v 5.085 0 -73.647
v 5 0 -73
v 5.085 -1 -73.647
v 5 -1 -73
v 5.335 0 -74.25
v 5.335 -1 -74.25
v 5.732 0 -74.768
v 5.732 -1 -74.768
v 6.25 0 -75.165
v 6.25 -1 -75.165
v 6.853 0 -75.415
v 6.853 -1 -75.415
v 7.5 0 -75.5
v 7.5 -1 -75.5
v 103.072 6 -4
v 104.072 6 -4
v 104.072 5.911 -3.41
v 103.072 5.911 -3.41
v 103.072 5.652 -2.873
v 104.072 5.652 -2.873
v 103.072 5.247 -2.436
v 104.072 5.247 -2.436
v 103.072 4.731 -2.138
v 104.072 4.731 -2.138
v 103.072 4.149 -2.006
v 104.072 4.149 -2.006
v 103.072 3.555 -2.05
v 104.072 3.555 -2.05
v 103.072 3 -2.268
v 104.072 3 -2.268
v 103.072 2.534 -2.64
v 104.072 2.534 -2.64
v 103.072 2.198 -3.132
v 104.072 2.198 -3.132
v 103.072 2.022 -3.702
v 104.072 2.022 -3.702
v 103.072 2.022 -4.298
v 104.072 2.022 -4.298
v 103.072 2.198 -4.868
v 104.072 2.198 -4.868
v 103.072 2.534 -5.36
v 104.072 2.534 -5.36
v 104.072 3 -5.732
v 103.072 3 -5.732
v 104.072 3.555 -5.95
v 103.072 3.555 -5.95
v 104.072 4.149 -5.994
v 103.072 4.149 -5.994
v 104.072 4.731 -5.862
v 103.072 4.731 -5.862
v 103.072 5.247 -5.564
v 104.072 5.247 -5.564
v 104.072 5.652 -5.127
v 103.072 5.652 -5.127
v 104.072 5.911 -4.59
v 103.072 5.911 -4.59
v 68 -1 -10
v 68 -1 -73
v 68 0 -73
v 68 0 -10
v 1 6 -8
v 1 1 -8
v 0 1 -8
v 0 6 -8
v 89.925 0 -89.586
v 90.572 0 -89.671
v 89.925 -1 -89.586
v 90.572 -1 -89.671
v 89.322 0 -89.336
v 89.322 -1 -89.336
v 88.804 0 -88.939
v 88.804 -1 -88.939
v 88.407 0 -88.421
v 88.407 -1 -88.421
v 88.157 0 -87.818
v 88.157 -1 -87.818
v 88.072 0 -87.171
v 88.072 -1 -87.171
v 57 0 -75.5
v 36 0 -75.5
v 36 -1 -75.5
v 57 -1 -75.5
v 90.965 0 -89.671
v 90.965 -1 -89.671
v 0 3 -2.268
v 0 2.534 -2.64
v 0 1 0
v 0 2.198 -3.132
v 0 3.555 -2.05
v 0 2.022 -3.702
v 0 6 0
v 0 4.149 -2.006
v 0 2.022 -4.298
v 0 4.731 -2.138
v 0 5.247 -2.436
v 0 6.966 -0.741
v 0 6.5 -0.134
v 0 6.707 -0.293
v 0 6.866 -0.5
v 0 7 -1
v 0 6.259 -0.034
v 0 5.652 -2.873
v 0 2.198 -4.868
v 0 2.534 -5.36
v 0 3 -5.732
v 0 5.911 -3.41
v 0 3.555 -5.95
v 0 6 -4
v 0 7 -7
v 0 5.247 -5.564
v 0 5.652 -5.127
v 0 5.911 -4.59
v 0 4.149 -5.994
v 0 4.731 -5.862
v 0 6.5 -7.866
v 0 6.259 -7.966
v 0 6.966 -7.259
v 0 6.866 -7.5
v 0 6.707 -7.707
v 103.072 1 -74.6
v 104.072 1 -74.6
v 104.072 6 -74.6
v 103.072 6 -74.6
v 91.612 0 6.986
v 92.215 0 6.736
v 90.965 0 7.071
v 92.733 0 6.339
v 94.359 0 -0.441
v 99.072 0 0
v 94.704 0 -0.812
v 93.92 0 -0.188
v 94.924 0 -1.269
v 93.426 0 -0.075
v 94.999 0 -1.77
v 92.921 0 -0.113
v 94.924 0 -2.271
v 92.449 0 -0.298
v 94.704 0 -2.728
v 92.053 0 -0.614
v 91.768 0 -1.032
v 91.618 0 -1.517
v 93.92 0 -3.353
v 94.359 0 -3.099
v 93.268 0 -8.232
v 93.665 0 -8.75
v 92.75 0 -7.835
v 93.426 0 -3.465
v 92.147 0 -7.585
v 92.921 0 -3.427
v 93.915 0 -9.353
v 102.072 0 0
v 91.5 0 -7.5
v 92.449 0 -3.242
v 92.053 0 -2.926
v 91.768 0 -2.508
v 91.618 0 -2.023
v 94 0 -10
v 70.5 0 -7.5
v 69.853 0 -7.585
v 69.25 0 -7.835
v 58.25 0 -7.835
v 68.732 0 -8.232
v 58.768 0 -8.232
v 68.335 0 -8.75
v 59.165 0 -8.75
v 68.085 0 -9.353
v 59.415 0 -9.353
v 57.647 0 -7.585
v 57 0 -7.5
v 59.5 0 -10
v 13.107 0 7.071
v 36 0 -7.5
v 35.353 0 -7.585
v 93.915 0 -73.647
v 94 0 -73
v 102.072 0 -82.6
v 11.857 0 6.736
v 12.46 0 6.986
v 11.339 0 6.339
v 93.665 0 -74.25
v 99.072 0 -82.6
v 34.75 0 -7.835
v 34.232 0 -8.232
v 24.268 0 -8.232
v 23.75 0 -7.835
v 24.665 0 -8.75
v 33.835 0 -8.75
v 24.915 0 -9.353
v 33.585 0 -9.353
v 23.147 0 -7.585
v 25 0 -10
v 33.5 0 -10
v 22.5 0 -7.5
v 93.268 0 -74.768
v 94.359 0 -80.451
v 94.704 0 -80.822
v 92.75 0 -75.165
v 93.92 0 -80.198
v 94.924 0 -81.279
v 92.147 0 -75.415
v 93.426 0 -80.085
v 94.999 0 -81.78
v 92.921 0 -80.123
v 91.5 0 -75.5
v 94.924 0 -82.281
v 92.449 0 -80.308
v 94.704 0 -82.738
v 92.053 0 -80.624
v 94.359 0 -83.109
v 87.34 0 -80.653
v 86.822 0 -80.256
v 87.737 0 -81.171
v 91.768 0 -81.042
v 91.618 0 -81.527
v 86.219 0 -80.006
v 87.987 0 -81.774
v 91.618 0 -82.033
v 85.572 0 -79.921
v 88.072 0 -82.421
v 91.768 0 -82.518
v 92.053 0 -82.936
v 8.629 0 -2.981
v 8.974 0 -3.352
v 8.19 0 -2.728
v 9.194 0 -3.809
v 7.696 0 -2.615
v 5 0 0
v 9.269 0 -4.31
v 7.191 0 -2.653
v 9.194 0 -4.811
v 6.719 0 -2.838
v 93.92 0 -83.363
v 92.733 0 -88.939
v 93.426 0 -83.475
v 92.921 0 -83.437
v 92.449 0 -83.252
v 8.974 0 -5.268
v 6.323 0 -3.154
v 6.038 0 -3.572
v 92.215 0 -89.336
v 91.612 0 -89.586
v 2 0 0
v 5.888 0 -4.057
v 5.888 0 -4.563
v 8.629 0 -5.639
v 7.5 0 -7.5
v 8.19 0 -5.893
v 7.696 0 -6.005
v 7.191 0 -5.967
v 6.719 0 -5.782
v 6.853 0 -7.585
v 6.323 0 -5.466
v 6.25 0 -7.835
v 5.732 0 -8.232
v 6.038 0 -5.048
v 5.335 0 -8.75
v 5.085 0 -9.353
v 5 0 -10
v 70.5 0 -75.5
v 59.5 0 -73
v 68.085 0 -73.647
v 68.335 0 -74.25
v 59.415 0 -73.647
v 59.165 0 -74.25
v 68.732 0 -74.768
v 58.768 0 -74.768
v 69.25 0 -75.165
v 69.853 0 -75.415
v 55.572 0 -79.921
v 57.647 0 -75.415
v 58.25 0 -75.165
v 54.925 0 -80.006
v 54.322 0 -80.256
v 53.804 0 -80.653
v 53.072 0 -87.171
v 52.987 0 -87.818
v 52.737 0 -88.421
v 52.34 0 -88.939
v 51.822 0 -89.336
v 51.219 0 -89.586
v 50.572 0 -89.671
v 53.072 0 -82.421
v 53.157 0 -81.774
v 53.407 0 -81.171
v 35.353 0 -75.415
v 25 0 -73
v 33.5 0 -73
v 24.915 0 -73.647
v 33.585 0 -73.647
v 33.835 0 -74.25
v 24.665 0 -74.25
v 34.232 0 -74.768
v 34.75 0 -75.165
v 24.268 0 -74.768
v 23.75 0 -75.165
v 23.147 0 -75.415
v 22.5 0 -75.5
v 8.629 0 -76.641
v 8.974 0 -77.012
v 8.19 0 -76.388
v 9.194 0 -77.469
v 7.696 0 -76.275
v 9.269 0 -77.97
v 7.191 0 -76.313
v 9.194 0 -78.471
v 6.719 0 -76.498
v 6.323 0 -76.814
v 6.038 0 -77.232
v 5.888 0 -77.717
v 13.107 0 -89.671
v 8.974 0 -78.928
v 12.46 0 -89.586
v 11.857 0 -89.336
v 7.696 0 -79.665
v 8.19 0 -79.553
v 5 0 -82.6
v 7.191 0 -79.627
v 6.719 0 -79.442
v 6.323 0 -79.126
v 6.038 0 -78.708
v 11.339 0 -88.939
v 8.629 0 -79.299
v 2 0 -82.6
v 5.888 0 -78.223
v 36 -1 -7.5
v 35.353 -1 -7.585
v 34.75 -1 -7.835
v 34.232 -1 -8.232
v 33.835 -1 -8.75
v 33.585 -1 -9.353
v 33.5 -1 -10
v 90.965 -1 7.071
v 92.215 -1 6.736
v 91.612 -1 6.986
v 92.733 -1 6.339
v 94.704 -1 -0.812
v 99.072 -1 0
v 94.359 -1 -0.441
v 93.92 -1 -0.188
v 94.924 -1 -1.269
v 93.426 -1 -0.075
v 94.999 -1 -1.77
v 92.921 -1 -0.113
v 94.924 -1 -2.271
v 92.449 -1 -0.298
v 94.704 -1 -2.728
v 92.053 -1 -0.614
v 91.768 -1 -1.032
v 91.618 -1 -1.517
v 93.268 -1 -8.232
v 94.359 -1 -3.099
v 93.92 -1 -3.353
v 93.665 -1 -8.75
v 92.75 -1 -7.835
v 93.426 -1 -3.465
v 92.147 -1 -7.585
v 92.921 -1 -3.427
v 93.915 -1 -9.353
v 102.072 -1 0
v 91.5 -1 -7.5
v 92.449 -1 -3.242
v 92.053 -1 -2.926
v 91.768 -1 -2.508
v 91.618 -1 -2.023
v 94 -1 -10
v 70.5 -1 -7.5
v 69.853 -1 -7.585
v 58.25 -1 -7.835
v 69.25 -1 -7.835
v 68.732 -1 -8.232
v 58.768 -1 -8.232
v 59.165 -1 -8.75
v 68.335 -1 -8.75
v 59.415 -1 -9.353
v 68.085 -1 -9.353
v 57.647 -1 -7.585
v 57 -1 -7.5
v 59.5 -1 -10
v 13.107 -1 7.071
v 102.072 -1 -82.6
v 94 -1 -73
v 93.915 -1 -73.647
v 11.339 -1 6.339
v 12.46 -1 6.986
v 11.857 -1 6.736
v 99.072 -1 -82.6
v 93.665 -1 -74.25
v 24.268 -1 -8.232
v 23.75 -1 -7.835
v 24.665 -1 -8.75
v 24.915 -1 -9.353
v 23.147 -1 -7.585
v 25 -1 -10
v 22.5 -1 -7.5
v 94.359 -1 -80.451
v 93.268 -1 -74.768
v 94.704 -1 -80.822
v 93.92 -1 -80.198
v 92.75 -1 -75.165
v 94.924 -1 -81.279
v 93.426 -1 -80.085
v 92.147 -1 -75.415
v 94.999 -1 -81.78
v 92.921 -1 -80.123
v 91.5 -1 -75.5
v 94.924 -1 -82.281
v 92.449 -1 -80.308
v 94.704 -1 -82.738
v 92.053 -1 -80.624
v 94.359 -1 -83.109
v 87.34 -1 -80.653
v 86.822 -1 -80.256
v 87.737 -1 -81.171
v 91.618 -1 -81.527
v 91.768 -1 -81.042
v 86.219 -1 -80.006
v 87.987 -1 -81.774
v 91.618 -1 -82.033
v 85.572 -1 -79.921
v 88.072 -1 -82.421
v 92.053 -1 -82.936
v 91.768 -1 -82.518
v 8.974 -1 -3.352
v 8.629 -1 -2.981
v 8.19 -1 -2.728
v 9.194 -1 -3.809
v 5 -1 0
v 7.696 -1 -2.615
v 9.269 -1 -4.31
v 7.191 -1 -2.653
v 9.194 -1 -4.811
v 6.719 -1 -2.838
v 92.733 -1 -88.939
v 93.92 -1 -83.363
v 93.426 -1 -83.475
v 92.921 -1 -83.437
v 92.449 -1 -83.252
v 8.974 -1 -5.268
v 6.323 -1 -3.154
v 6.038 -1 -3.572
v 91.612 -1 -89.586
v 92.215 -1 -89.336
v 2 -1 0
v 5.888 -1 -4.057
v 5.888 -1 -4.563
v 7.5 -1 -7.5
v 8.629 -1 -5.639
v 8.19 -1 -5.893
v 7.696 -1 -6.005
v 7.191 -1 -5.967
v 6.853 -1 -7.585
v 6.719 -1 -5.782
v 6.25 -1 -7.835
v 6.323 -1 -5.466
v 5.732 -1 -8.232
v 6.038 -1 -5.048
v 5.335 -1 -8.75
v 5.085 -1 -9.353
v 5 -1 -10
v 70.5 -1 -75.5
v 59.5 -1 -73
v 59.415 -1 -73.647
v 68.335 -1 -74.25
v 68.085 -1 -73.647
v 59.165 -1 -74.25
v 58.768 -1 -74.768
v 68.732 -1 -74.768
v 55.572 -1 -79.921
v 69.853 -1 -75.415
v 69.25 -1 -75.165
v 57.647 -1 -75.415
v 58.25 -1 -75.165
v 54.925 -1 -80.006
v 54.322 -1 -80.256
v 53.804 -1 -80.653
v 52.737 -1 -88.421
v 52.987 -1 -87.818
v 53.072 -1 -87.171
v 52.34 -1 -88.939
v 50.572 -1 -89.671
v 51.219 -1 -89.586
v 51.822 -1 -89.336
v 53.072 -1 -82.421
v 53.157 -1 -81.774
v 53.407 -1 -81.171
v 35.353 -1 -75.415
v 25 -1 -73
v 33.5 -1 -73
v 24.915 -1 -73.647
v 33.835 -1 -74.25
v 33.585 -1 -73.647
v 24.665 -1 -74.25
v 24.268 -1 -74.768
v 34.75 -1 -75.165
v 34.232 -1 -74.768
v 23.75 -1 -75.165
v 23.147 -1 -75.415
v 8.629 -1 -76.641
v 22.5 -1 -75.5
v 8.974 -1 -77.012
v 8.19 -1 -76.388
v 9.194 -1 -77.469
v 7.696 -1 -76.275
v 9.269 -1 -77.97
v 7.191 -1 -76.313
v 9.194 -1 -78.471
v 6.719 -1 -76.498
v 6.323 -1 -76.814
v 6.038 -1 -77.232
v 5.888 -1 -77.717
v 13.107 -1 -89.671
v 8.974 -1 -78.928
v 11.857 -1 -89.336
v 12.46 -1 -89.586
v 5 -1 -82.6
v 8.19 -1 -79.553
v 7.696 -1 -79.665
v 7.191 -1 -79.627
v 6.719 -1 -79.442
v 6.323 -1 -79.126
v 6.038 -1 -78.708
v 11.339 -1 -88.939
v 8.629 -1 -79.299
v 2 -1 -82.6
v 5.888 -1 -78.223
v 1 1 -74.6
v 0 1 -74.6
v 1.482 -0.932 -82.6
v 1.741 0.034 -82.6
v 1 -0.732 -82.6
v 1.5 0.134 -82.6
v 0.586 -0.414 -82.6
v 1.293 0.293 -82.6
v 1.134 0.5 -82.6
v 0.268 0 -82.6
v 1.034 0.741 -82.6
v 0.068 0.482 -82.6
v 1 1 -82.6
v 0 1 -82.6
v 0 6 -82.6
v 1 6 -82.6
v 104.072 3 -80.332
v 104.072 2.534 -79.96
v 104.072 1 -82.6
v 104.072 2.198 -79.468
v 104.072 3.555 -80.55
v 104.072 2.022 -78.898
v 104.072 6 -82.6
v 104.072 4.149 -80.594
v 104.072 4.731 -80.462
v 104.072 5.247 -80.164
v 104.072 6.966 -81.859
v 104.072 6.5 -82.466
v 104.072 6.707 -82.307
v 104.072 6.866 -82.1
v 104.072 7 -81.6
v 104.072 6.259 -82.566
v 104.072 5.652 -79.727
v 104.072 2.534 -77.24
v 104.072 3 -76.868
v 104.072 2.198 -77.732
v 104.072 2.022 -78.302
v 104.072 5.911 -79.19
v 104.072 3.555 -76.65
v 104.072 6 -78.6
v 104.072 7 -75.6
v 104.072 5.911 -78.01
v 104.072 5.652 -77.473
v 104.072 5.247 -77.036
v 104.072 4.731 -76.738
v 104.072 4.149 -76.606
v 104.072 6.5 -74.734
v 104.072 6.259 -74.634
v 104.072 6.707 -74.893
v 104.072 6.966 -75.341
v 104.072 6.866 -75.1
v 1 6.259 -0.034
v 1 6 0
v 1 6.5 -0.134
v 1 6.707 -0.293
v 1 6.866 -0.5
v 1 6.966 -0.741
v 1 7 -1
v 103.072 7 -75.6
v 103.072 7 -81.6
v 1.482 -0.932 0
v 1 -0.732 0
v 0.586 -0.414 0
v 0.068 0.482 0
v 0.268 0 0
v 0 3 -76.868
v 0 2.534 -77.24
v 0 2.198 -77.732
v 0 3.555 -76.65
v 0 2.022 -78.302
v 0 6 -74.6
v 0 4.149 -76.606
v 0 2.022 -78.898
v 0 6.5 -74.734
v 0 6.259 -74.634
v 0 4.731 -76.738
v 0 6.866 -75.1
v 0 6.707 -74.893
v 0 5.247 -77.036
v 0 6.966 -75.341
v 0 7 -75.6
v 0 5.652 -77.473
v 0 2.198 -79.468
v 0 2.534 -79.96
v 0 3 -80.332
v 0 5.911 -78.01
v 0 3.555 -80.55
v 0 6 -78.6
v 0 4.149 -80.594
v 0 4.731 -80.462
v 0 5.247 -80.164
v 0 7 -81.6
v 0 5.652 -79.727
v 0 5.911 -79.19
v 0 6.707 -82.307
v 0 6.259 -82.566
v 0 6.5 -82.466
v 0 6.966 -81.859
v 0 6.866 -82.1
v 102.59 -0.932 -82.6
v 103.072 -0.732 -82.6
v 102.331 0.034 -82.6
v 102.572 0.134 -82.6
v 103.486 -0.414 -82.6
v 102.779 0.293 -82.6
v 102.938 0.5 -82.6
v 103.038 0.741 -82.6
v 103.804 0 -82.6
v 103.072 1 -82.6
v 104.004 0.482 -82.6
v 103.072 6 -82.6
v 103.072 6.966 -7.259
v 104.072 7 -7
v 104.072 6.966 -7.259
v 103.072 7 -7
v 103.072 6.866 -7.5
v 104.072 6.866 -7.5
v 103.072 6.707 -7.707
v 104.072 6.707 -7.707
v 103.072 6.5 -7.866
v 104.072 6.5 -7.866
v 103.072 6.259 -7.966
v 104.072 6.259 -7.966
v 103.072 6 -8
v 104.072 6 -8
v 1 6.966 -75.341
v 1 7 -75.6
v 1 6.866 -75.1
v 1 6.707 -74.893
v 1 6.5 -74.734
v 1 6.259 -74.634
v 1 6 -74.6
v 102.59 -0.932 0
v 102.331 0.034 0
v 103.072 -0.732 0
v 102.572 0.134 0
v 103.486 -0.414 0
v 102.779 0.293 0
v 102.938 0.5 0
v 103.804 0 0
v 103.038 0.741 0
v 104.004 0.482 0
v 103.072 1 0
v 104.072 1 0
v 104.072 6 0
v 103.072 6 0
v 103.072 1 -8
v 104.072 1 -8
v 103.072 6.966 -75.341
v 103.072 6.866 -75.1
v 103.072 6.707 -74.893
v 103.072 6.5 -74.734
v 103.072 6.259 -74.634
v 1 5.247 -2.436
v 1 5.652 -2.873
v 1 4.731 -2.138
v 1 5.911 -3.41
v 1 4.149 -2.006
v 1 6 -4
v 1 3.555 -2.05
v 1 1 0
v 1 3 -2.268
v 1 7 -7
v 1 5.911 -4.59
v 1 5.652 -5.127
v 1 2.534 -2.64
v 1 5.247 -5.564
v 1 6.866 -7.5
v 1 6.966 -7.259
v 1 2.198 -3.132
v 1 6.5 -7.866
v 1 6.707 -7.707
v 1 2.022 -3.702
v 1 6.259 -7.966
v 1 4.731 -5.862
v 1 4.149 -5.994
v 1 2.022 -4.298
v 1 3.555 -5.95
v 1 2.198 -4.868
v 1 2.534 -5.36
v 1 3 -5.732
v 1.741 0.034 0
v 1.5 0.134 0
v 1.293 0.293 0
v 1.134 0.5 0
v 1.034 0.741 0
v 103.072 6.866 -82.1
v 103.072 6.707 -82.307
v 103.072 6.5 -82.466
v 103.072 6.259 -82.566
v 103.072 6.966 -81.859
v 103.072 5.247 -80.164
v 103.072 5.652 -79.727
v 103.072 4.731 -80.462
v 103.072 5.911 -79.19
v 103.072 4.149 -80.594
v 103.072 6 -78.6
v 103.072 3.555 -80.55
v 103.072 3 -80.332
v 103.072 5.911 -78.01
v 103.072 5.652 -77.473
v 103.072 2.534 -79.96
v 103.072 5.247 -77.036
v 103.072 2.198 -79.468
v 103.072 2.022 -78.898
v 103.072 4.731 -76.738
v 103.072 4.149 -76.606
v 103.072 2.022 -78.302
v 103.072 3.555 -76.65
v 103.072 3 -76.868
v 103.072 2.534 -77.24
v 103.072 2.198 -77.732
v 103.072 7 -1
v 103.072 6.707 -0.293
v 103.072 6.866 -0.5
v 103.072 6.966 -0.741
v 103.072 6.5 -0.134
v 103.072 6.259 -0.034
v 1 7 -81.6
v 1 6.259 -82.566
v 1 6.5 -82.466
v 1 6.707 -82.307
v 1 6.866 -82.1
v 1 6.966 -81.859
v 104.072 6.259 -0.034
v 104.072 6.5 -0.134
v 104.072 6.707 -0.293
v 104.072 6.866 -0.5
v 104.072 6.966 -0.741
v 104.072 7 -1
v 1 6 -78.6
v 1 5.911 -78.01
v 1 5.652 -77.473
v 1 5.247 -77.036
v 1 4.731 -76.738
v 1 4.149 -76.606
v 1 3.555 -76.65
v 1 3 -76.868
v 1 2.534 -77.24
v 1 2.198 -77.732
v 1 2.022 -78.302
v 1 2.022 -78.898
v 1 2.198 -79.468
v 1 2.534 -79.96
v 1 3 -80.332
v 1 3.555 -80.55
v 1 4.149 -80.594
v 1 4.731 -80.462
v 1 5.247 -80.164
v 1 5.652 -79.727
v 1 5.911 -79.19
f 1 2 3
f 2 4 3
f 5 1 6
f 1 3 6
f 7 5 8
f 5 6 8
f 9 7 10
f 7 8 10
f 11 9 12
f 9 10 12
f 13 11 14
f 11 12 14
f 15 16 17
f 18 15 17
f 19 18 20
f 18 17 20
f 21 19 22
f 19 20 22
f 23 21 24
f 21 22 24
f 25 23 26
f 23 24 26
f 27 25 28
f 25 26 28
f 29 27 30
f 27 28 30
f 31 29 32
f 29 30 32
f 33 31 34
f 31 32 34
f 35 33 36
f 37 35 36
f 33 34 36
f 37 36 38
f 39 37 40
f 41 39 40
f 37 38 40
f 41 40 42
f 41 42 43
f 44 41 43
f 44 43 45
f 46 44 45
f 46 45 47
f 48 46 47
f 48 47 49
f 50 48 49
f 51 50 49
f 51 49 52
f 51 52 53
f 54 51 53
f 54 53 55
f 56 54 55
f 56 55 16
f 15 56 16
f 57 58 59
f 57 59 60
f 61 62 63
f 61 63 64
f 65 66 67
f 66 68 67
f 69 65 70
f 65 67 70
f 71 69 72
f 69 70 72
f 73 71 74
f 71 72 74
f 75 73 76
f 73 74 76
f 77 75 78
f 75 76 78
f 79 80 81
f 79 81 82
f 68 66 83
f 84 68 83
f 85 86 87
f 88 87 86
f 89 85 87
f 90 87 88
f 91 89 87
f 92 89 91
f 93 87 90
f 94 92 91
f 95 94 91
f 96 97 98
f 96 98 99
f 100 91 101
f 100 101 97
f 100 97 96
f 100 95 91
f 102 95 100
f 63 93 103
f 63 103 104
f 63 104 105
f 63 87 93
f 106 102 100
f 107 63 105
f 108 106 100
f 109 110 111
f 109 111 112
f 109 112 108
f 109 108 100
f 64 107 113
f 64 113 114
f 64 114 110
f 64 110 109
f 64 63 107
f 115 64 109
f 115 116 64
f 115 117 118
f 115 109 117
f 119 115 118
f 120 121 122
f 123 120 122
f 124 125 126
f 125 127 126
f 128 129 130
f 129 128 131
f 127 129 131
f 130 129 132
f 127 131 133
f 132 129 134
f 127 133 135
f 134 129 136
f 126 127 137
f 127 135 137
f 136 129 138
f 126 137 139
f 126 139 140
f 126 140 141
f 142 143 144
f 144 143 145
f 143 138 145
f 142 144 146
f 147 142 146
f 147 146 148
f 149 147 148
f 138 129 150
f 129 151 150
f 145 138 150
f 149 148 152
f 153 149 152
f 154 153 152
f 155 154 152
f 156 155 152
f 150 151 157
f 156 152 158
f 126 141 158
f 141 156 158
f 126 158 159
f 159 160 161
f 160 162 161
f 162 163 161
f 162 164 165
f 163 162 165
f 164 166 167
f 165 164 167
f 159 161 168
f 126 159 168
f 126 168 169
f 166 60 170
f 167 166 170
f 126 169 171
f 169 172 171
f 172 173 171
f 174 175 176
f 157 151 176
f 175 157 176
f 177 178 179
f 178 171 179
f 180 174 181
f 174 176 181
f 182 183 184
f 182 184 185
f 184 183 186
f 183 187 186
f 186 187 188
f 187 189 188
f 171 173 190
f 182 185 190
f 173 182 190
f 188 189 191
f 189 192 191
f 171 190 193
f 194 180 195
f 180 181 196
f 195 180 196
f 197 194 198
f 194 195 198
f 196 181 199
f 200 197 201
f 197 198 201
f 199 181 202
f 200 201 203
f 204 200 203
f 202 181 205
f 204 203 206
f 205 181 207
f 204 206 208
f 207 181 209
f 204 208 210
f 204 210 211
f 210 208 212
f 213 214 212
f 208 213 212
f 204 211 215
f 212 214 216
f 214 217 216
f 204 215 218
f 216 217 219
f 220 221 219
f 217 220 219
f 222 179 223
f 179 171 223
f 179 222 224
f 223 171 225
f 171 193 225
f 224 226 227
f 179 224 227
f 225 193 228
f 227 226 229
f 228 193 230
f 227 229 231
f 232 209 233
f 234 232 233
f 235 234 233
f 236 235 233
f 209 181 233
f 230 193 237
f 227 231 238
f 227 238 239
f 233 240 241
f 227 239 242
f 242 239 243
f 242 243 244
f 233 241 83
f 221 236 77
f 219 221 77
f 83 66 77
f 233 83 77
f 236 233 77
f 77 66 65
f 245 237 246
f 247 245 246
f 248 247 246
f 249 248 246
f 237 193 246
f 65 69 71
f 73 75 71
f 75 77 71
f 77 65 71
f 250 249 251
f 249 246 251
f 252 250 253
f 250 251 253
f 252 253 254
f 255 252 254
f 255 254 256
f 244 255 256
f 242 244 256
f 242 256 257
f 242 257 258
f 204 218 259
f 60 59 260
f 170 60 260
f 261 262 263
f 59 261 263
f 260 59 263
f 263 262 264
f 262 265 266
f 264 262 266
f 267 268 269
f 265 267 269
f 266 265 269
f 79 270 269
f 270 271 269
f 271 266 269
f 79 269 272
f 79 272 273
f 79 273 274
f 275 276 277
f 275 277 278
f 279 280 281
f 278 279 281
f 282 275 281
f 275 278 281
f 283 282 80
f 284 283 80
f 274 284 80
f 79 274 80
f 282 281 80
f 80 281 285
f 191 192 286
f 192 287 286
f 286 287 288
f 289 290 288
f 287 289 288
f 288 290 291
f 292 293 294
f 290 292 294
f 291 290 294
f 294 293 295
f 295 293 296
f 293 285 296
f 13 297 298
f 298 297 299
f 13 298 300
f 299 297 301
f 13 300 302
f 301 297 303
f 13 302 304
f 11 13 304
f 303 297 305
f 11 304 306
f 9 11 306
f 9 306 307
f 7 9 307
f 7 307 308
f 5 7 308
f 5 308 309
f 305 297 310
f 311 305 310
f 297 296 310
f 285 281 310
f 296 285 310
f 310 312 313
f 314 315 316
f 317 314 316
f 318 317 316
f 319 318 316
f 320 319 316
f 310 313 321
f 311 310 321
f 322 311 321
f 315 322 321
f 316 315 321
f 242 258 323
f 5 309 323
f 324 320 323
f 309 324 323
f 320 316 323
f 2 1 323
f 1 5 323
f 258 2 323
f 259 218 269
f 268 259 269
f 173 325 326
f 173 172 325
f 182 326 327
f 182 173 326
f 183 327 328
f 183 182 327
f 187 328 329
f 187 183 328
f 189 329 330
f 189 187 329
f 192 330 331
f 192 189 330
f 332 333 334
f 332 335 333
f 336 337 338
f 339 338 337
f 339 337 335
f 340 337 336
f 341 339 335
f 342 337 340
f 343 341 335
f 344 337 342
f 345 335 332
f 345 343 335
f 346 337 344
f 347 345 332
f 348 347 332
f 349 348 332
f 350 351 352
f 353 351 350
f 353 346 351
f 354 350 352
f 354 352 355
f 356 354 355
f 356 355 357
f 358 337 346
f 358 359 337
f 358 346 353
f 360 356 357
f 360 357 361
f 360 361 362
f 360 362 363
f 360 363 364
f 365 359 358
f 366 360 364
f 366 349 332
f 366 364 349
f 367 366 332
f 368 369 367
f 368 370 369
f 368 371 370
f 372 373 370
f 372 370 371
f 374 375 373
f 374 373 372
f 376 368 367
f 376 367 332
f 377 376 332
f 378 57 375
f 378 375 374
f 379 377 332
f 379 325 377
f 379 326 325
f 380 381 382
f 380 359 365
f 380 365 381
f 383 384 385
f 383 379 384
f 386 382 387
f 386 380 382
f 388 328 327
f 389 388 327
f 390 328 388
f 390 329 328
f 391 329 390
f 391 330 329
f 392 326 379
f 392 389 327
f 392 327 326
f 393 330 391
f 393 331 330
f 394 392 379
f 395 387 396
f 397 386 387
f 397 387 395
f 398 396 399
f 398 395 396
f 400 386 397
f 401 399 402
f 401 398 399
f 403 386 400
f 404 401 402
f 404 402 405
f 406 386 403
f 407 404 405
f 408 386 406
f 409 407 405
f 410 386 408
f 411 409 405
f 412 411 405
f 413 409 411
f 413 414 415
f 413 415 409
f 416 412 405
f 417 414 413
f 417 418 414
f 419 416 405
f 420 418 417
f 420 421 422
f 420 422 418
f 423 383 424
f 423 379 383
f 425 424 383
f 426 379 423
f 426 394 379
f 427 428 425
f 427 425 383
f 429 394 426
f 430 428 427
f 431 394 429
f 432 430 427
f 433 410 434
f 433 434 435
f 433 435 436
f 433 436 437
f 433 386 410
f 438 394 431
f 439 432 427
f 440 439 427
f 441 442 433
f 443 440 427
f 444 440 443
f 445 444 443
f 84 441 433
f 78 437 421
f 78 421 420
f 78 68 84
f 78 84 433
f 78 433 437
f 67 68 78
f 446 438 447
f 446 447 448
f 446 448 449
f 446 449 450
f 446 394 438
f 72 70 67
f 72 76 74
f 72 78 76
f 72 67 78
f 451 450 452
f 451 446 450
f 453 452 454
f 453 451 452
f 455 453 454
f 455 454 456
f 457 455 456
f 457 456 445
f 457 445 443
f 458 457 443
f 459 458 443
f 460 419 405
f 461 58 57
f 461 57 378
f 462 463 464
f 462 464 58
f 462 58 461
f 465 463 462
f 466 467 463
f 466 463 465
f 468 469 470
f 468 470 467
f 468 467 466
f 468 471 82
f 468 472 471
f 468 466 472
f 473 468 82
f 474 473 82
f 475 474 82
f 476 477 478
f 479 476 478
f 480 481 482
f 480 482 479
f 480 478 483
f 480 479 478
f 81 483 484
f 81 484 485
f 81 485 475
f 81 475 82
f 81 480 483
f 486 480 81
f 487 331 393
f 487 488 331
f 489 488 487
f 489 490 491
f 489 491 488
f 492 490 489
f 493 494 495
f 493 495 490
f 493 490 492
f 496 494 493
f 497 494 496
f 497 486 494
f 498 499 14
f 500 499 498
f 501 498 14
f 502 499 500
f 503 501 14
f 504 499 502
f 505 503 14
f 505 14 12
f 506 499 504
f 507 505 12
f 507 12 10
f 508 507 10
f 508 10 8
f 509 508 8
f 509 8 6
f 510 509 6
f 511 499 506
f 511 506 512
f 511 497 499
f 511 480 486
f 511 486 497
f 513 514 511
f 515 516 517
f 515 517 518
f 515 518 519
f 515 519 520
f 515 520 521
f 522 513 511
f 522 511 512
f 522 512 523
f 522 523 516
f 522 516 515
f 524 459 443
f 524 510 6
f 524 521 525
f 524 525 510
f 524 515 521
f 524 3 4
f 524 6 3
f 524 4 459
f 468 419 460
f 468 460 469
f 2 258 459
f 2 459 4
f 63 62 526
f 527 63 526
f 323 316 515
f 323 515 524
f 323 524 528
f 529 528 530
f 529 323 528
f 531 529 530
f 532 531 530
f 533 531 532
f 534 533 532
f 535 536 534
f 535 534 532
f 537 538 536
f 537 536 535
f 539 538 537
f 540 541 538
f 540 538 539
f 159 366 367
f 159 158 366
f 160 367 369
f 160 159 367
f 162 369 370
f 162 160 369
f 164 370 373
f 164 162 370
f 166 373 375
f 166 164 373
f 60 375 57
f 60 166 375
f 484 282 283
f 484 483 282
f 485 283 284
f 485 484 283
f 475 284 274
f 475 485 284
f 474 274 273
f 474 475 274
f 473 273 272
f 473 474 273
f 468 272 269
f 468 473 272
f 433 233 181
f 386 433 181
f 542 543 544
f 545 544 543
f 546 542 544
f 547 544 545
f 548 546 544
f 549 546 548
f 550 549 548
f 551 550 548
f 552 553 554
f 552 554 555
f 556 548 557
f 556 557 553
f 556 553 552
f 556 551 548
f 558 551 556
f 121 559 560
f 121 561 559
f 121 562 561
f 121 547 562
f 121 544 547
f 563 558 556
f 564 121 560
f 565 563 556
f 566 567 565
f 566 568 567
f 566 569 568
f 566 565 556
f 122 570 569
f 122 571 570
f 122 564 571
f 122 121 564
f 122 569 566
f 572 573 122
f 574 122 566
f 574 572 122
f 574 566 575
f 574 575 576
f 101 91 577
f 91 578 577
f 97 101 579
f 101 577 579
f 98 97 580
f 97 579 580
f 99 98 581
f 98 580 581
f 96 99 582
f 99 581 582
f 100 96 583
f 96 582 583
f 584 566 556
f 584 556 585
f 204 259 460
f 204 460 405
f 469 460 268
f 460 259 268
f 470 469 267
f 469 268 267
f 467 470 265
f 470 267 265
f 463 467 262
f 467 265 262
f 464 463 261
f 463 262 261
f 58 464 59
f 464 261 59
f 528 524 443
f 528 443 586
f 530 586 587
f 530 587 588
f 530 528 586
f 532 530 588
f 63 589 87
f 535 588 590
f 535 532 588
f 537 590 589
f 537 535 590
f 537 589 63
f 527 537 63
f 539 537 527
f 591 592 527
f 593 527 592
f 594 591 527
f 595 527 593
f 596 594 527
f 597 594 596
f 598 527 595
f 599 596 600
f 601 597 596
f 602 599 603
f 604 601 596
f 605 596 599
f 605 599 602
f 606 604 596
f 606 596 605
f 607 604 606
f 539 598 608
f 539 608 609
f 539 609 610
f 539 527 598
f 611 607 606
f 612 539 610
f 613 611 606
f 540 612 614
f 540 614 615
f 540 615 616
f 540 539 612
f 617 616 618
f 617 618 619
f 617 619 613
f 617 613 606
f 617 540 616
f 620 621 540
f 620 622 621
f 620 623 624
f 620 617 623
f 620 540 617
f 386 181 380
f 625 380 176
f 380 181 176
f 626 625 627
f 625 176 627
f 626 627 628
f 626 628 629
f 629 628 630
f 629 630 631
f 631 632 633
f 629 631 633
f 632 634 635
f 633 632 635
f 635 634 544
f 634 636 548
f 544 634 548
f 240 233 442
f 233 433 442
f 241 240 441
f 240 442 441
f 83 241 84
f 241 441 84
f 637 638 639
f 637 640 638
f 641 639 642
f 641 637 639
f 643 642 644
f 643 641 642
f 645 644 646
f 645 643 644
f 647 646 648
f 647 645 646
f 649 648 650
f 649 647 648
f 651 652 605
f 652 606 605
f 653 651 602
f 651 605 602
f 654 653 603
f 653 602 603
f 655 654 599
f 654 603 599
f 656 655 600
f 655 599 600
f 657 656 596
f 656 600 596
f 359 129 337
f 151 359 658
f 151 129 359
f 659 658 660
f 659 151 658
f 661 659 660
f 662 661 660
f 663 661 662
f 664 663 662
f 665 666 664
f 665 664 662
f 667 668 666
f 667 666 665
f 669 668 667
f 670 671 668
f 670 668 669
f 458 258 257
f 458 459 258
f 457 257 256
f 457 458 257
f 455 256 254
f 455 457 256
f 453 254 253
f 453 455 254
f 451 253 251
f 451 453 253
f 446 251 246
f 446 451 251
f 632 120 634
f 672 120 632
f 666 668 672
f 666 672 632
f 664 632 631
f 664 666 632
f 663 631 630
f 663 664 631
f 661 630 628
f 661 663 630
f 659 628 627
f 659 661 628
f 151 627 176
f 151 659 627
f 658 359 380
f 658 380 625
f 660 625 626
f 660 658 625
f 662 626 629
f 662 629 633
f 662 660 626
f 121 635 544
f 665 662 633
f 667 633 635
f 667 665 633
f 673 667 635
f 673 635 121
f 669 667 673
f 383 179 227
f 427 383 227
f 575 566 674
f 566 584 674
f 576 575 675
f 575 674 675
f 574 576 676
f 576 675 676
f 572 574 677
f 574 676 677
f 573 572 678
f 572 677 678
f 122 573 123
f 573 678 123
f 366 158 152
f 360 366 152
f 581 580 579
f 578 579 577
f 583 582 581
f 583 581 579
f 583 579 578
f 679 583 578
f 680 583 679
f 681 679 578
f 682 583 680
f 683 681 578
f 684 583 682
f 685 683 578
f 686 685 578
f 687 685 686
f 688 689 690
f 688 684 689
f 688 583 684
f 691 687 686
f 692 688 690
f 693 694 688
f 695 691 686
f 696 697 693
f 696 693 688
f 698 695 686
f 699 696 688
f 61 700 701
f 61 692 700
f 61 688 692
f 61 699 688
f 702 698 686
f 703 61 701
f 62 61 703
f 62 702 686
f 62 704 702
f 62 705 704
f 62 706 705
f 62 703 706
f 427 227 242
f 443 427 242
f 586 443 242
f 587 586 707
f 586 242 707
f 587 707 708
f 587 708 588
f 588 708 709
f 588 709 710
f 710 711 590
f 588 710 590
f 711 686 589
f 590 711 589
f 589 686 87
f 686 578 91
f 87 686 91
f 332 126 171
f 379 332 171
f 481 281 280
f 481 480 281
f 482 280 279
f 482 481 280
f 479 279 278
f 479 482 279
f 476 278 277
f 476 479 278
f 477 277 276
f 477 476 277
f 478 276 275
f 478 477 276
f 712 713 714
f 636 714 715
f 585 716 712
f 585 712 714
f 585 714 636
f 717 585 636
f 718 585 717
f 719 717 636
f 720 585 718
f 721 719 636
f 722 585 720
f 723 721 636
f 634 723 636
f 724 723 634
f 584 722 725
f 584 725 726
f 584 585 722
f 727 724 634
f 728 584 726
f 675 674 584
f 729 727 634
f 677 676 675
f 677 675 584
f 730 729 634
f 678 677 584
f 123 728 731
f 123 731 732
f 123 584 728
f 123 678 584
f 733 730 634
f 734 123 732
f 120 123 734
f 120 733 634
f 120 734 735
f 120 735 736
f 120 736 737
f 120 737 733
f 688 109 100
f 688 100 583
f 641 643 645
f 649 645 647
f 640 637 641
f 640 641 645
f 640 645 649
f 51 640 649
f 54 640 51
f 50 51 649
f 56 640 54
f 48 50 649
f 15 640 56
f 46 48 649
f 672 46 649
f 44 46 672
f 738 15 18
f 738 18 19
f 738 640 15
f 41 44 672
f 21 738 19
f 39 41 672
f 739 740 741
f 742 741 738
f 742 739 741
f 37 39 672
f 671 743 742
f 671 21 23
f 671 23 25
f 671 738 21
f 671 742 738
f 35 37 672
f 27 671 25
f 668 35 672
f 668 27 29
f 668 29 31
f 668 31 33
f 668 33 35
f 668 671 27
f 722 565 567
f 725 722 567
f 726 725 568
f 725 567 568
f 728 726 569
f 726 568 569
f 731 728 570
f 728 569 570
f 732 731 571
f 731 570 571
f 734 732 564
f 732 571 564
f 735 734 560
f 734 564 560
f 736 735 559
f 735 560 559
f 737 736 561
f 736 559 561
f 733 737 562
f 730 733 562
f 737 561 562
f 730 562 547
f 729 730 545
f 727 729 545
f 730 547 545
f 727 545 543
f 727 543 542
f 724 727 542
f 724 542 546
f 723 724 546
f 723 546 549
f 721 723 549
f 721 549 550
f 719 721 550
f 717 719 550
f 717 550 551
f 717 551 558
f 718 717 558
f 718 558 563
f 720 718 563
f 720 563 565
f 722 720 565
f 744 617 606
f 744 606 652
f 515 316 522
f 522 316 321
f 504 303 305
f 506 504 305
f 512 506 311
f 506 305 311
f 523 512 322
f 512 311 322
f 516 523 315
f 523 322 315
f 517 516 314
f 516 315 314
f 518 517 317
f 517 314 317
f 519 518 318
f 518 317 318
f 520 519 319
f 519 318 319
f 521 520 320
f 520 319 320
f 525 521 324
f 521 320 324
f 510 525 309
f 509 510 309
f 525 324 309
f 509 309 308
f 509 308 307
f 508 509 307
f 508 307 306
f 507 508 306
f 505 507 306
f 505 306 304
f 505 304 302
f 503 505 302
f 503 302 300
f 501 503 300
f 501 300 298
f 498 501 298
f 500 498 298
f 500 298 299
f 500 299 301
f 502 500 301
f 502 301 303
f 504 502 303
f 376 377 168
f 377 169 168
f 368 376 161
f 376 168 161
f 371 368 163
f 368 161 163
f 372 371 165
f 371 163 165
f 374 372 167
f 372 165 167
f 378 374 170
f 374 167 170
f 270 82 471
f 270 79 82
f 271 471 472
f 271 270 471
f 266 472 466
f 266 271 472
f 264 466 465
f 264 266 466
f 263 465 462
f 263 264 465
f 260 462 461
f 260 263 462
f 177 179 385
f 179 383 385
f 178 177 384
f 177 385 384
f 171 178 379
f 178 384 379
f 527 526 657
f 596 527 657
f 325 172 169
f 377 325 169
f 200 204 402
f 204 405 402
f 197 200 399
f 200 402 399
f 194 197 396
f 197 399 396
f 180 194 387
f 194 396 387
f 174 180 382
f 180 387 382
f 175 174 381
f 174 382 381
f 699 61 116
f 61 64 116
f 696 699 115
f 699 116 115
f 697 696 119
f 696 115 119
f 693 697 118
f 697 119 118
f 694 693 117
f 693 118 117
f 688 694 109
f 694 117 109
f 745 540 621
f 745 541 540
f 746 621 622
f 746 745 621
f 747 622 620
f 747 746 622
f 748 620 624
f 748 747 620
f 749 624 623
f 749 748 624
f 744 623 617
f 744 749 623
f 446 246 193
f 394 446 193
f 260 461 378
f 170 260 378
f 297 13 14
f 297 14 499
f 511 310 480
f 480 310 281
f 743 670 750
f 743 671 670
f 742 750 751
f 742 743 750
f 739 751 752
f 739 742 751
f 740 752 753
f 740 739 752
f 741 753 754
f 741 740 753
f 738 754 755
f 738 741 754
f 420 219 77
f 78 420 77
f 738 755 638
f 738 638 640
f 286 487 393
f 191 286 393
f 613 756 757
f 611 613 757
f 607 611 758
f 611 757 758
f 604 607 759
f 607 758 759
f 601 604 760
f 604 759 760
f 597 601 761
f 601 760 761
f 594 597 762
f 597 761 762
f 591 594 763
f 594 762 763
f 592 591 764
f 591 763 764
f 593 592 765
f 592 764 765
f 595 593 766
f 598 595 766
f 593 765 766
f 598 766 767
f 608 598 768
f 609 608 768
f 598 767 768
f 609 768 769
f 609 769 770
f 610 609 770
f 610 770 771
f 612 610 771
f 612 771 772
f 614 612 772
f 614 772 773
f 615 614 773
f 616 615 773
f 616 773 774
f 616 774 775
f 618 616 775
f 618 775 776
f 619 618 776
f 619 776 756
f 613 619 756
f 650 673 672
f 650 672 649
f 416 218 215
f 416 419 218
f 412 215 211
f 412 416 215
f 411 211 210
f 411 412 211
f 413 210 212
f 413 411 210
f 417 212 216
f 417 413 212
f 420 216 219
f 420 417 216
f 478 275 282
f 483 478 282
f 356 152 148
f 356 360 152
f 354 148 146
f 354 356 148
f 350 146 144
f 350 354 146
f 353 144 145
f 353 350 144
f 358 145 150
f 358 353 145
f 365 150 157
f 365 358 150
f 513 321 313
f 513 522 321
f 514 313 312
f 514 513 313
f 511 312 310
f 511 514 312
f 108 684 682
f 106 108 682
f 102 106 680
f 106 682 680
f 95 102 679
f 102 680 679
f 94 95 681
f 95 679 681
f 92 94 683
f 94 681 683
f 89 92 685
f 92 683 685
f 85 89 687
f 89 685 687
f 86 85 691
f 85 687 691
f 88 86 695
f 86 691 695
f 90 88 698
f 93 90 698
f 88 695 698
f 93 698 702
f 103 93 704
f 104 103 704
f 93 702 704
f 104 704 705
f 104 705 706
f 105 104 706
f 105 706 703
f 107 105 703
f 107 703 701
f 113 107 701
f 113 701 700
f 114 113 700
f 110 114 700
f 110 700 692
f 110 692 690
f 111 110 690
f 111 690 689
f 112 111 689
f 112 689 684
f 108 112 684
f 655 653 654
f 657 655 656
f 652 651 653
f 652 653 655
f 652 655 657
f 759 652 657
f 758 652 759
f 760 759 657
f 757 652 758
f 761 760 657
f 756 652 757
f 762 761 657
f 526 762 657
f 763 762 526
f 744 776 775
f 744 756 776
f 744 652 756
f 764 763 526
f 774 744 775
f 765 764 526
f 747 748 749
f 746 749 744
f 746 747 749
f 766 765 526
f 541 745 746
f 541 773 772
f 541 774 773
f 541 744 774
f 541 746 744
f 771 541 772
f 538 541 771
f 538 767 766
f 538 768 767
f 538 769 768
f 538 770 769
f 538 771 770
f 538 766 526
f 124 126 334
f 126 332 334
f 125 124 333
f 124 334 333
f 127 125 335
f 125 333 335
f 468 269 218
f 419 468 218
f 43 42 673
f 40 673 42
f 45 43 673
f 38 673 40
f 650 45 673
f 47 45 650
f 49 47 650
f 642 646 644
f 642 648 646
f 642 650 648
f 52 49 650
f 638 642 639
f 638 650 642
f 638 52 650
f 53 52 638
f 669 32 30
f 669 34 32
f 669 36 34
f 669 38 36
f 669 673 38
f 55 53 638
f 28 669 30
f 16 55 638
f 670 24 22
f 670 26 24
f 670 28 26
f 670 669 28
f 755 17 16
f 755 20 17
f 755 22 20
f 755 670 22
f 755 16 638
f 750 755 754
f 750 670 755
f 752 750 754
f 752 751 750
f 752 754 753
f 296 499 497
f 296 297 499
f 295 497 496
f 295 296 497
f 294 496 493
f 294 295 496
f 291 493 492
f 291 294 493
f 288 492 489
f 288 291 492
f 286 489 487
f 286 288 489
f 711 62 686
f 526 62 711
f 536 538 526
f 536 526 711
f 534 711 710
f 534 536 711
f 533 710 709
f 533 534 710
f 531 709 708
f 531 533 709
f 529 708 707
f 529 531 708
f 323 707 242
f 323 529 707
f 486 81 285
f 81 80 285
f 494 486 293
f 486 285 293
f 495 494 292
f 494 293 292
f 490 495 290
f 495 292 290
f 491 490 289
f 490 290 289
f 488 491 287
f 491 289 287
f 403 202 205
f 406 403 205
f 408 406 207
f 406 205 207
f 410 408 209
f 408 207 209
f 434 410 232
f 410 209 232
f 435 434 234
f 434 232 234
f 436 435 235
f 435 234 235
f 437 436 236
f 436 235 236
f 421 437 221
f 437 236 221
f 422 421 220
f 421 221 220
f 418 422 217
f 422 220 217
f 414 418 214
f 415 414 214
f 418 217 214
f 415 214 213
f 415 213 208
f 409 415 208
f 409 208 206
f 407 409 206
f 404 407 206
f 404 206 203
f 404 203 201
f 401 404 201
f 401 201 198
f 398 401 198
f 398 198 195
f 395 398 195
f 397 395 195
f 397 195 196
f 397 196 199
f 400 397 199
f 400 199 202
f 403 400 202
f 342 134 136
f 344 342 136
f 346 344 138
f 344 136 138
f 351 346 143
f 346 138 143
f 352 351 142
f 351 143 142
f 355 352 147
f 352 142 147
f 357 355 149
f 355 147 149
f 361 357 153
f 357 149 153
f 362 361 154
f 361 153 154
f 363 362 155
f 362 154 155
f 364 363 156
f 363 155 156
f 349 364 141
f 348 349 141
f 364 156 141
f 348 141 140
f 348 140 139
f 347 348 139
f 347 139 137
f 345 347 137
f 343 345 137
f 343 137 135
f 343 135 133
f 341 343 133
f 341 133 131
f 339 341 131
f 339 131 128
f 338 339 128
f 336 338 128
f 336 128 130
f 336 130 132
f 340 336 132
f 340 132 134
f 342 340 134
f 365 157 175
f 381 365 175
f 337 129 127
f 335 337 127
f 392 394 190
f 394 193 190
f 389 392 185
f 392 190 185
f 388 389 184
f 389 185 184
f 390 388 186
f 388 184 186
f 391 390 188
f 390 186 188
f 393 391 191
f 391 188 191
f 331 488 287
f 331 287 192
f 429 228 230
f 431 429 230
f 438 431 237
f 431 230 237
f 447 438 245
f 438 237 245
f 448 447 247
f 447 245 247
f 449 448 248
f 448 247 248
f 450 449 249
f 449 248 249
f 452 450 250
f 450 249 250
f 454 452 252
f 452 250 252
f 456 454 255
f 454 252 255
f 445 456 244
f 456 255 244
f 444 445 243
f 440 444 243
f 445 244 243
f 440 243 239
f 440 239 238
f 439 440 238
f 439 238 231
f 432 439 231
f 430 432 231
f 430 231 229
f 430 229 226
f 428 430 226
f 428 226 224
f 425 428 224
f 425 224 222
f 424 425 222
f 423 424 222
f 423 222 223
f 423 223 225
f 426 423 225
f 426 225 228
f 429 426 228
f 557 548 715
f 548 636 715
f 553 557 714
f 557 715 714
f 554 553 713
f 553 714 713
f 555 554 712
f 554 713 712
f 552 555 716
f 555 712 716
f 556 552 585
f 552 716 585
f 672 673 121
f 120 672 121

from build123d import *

# Parameters (mm, degrees)
SKETCH1_W                      = 89
SKETCH1_H                      = 68
BASE_FLANGE2_DEPTH             = 1
EDGE_FLANGE1_STRIP_W           = 6
EDGE_FLANGE1_STRIP_H           = 1
EDGE_FLANGE1_STRIP_CUT_DEPTH   = 82.6
EDGE_FLANGE1_STRIP_2_W         = 6
EDGE_FLANGE1_STRIP_2_H         = 1
EDGE_FLANGE1_STRIP_CUT_2_DEPTH = 82.6
EDGE_FLANGE1_DEPTH             = 82.6
EDGE_FLANGE1_BEND_DEPTH        = 82.6
SKETCH16_W                     = 66.6
SKETCH16_H                     = 7
CUT_EXTRUDE1_DEPTH             = 138.553195479
FILLET1_R                      = 1
SKETCH17_R                     = 2
CUT_EXTRUDE2_DEPTH             = 138.553195479
M3_CLEARANCE_HOLE1_D           = 3.4
FILLET2_R                      = 2.5
SKETCH20_W                     = 8.5
SKETCH20_H                     = 68
BOSS_EXTRUDE1_DEPTH            = 1
FILLET3_R                      = 2.5


# Sheet-metal steps are written as plain solids
with BuildPart() as part:
    # Sketch1 → Base-Flange2 (new body)
    with BuildSketch(Plane(origin=(0, 0, 0), x_dir=(1, 0, 0), z_dir=(0, 1, 0))):
        Polygon((0, 0), (0, 82.6), (5, 82.6), (12.071067812, 89.671067812), (53.072, 89.671067812), (53.072, 79.921067812), (88.072, 79.921067812), (88.072, 89.671067812), (92.000932188, 89.671067812), (99.072, 82.6), (104.072, 82.6), (104.072, 0), (99.072, 0), (92.000932188, -7.071067812), (12.071067812, -7.071067812), (5, 0), align=None)
        with Locations((49.5, 41.5)):
            Rectangle(SKETCH1_W, SKETCH1_H, mode=Mode.SUBTRACT)
    extrude(amount=-BASE_FLANGE2_DEPTH)

    # Edge-Flange1 strip (across the edge) → Edge-Flange1 strip cut (cut)
    with BuildSketch(Plane(origin=(104.072, 0, 0), x_dir=(-1, 0, 0), z_dir=(0, 0, -1))):
        with Locations((-1, -0.5)):
            Rectangle(EDGE_FLANGE1_STRIP_W, EDGE_FLANGE1_STRIP_H)
    extrude(amount=EDGE_FLANGE1_STRIP_CUT_DEPTH, mode=Mode.SUBTRACT)

    # Edge-Flange1 strip 2 (across the edge) → Edge-Flange1 strip cut 2 (cut)
    with BuildSketch(Plane.XY.offset(-82.6)):
        with Locations((-1, -0.5)):
            Rectangle(EDGE_FLANGE1_STRIP_2_W, EDGE_FLANGE1_STRIP_2_H)
    extrude(amount=EDGE_FLANGE1_STRIP_CUT_2_DEPTH, mode=Mode.SUBTRACT)

    # Edge-Flange1 section (across the edge) → Edge-Flange1 (add)
    with BuildSketch(Plane(origin=(104.072, 0, 0), x_dir=(-1, 0, 0), z_dir=(0, 0, -1))):
        with BuildLine():
            Line((0, 1), (0, 7))
            Line((0, 7), (1, 7))
            Line((1, 7), (1, 1))
            ThreePointArc((1, 1), (1.292893219, 0.292893219), (2, 0))
            Line((2, 0), (2, -1))
            ThreePointArc((2, -1), (0.585786438, -0.414213562), (0, 1))
        make_face()
    extrude(amount=EDGE_FLANGE1_DEPTH)

    # Edge-Flange1 section 2 (across the edge) → Edge-Flange1 bend (add)
    with BuildSketch(Plane.XY.offset(-82.6)):
        with BuildLine():
            Line((0, 1), (0, 7))
            Line((0, 7), (1, 7))
            Line((1, 7), (1, 1))
            ThreePointArc((1, 1), (1.292893219, 0.292893219), (2, 0))
            Line((2, 0), (2, -1))
            ThreePointArc((2, -1), (0.585786438, -0.414213562), (0, 1))
        make_face()
    extrude(amount=EDGE_FLANGE1_BEND_DEPTH)

    # Sketch16 → Cut-Extrude1 (cut, through all)
    with BuildSketch(Plane(origin=(104.072, 0, 0), x_dir=(0, 0, -1), z_dir=(1, 0, 0))):
        with Locations((41.3, 4.5)):
            Rectangle(SKETCH16_W, SKETCH16_H)
    extrude(amount=-CUT_EXTRUDE1_DEPTH, mode=Mode.SUBTRACT)

    # Fillet1
    fillet1_edges = [part.edges().sort_by_distance(p)[0] for p in [
        (0.5, 7, -82.6),
        (0.5, 7, 0),
        (0.5, 7, -74.6),
        (0.5, 7, -8),
        (103.572, 7, -8),
        (103.572, 7, -74.6),
        (103.572, 7, 0),
        (103.572, 7, -82.6),
    ]]
    fillet(fillet1_edges, radius=FILLET1_R)

    # Sketch17 → Cut-Extrude2 (cut, through all)
    with BuildSketch(Plane(origin=(104.072, 0, 0), x_dir=(0, 0, -1), z_dir=(1, 0, 0))):
        with Locations(Location((4, 4, 0), (0, 0, 90))):
            Circle(SKETCH17_R)
        with Locations(Location((78.6, 4, 0), (0, 0, 90))):
            Circle(SKETCH17_R)
    extrude(amount=-CUT_EXTRUDE2_DEPTH, mode=Mode.SUBTRACT)

    # M3 Clearance Hole1 (through all)
    with Locations(Plane(origin=(0, -1, 0), x_dir=(-1, 0, 0), z_dir=(0, -1, 0))):
        with Locations((-93.299383015, 81.780067732), (-7.569381755, 77.970067732), (-7.569381755, 4.310067732), (-93.299383015, 1.770067732)):
            Hole(M3_CLEARANCE_HOLE1_D / 2)

    # Fillet2
    fillet2_edges = [part.edges().sort_by_distance(p)[0] for p in [
        (12.071067812, -0.5, -89.671067812),
        (53.072, -0.5, -89.671067812),
        (53.072, -0.5, -79.921067812),
        (88.072, -0.5, -79.921067812),
        (88.072, -0.5, -89.671067812),
        (92.000932188, -0.5, -89.671067812),
        (92.000932188, -0.5, 7.071067812),
        (12.071067812, -0.5, 7.071067812),
        (5, -0.5, -75.5),
        (94, -0.5, -75.5),
        (94, -0.5, -7.5),
        (5, -0.5, -7.5),
    ]]
    fillet(fillet2_edges, radius=FILLET2_R)

    # Sketch20 → Boss-Extrude1 (add)
    with BuildSketch(Plane.XZ.offset(1)):
        with Locations((29.25, -41.5)):
            Rectangle(SKETCH20_W, SKETCH20_H)
        with Locations((63.75, -41.5)):
            Rectangle(SKETCH20_W, SKETCH20_H)
    extrude(amount=-BOSS_EXTRUDE1_DEPTH)

    # Fillet3
    fillet3_edges = [part.edges().sort_by_distance(p)[0] for p in [
        (33.5, -0.5, -75.5),
        (25, -0.5, -75.5),
        (25, -0.5, -7.5),
        (33.5, -0.5, -7.5),
        (68, -0.5, -75.5),
        (59.5, -0.5, -75.5),
        (59.5, -0.5, -7.5),
        (68, -0.5, -7.5),
    ]]
    fillet(fillet3_edges, radius=FILLET3_R)


solid = part.part
